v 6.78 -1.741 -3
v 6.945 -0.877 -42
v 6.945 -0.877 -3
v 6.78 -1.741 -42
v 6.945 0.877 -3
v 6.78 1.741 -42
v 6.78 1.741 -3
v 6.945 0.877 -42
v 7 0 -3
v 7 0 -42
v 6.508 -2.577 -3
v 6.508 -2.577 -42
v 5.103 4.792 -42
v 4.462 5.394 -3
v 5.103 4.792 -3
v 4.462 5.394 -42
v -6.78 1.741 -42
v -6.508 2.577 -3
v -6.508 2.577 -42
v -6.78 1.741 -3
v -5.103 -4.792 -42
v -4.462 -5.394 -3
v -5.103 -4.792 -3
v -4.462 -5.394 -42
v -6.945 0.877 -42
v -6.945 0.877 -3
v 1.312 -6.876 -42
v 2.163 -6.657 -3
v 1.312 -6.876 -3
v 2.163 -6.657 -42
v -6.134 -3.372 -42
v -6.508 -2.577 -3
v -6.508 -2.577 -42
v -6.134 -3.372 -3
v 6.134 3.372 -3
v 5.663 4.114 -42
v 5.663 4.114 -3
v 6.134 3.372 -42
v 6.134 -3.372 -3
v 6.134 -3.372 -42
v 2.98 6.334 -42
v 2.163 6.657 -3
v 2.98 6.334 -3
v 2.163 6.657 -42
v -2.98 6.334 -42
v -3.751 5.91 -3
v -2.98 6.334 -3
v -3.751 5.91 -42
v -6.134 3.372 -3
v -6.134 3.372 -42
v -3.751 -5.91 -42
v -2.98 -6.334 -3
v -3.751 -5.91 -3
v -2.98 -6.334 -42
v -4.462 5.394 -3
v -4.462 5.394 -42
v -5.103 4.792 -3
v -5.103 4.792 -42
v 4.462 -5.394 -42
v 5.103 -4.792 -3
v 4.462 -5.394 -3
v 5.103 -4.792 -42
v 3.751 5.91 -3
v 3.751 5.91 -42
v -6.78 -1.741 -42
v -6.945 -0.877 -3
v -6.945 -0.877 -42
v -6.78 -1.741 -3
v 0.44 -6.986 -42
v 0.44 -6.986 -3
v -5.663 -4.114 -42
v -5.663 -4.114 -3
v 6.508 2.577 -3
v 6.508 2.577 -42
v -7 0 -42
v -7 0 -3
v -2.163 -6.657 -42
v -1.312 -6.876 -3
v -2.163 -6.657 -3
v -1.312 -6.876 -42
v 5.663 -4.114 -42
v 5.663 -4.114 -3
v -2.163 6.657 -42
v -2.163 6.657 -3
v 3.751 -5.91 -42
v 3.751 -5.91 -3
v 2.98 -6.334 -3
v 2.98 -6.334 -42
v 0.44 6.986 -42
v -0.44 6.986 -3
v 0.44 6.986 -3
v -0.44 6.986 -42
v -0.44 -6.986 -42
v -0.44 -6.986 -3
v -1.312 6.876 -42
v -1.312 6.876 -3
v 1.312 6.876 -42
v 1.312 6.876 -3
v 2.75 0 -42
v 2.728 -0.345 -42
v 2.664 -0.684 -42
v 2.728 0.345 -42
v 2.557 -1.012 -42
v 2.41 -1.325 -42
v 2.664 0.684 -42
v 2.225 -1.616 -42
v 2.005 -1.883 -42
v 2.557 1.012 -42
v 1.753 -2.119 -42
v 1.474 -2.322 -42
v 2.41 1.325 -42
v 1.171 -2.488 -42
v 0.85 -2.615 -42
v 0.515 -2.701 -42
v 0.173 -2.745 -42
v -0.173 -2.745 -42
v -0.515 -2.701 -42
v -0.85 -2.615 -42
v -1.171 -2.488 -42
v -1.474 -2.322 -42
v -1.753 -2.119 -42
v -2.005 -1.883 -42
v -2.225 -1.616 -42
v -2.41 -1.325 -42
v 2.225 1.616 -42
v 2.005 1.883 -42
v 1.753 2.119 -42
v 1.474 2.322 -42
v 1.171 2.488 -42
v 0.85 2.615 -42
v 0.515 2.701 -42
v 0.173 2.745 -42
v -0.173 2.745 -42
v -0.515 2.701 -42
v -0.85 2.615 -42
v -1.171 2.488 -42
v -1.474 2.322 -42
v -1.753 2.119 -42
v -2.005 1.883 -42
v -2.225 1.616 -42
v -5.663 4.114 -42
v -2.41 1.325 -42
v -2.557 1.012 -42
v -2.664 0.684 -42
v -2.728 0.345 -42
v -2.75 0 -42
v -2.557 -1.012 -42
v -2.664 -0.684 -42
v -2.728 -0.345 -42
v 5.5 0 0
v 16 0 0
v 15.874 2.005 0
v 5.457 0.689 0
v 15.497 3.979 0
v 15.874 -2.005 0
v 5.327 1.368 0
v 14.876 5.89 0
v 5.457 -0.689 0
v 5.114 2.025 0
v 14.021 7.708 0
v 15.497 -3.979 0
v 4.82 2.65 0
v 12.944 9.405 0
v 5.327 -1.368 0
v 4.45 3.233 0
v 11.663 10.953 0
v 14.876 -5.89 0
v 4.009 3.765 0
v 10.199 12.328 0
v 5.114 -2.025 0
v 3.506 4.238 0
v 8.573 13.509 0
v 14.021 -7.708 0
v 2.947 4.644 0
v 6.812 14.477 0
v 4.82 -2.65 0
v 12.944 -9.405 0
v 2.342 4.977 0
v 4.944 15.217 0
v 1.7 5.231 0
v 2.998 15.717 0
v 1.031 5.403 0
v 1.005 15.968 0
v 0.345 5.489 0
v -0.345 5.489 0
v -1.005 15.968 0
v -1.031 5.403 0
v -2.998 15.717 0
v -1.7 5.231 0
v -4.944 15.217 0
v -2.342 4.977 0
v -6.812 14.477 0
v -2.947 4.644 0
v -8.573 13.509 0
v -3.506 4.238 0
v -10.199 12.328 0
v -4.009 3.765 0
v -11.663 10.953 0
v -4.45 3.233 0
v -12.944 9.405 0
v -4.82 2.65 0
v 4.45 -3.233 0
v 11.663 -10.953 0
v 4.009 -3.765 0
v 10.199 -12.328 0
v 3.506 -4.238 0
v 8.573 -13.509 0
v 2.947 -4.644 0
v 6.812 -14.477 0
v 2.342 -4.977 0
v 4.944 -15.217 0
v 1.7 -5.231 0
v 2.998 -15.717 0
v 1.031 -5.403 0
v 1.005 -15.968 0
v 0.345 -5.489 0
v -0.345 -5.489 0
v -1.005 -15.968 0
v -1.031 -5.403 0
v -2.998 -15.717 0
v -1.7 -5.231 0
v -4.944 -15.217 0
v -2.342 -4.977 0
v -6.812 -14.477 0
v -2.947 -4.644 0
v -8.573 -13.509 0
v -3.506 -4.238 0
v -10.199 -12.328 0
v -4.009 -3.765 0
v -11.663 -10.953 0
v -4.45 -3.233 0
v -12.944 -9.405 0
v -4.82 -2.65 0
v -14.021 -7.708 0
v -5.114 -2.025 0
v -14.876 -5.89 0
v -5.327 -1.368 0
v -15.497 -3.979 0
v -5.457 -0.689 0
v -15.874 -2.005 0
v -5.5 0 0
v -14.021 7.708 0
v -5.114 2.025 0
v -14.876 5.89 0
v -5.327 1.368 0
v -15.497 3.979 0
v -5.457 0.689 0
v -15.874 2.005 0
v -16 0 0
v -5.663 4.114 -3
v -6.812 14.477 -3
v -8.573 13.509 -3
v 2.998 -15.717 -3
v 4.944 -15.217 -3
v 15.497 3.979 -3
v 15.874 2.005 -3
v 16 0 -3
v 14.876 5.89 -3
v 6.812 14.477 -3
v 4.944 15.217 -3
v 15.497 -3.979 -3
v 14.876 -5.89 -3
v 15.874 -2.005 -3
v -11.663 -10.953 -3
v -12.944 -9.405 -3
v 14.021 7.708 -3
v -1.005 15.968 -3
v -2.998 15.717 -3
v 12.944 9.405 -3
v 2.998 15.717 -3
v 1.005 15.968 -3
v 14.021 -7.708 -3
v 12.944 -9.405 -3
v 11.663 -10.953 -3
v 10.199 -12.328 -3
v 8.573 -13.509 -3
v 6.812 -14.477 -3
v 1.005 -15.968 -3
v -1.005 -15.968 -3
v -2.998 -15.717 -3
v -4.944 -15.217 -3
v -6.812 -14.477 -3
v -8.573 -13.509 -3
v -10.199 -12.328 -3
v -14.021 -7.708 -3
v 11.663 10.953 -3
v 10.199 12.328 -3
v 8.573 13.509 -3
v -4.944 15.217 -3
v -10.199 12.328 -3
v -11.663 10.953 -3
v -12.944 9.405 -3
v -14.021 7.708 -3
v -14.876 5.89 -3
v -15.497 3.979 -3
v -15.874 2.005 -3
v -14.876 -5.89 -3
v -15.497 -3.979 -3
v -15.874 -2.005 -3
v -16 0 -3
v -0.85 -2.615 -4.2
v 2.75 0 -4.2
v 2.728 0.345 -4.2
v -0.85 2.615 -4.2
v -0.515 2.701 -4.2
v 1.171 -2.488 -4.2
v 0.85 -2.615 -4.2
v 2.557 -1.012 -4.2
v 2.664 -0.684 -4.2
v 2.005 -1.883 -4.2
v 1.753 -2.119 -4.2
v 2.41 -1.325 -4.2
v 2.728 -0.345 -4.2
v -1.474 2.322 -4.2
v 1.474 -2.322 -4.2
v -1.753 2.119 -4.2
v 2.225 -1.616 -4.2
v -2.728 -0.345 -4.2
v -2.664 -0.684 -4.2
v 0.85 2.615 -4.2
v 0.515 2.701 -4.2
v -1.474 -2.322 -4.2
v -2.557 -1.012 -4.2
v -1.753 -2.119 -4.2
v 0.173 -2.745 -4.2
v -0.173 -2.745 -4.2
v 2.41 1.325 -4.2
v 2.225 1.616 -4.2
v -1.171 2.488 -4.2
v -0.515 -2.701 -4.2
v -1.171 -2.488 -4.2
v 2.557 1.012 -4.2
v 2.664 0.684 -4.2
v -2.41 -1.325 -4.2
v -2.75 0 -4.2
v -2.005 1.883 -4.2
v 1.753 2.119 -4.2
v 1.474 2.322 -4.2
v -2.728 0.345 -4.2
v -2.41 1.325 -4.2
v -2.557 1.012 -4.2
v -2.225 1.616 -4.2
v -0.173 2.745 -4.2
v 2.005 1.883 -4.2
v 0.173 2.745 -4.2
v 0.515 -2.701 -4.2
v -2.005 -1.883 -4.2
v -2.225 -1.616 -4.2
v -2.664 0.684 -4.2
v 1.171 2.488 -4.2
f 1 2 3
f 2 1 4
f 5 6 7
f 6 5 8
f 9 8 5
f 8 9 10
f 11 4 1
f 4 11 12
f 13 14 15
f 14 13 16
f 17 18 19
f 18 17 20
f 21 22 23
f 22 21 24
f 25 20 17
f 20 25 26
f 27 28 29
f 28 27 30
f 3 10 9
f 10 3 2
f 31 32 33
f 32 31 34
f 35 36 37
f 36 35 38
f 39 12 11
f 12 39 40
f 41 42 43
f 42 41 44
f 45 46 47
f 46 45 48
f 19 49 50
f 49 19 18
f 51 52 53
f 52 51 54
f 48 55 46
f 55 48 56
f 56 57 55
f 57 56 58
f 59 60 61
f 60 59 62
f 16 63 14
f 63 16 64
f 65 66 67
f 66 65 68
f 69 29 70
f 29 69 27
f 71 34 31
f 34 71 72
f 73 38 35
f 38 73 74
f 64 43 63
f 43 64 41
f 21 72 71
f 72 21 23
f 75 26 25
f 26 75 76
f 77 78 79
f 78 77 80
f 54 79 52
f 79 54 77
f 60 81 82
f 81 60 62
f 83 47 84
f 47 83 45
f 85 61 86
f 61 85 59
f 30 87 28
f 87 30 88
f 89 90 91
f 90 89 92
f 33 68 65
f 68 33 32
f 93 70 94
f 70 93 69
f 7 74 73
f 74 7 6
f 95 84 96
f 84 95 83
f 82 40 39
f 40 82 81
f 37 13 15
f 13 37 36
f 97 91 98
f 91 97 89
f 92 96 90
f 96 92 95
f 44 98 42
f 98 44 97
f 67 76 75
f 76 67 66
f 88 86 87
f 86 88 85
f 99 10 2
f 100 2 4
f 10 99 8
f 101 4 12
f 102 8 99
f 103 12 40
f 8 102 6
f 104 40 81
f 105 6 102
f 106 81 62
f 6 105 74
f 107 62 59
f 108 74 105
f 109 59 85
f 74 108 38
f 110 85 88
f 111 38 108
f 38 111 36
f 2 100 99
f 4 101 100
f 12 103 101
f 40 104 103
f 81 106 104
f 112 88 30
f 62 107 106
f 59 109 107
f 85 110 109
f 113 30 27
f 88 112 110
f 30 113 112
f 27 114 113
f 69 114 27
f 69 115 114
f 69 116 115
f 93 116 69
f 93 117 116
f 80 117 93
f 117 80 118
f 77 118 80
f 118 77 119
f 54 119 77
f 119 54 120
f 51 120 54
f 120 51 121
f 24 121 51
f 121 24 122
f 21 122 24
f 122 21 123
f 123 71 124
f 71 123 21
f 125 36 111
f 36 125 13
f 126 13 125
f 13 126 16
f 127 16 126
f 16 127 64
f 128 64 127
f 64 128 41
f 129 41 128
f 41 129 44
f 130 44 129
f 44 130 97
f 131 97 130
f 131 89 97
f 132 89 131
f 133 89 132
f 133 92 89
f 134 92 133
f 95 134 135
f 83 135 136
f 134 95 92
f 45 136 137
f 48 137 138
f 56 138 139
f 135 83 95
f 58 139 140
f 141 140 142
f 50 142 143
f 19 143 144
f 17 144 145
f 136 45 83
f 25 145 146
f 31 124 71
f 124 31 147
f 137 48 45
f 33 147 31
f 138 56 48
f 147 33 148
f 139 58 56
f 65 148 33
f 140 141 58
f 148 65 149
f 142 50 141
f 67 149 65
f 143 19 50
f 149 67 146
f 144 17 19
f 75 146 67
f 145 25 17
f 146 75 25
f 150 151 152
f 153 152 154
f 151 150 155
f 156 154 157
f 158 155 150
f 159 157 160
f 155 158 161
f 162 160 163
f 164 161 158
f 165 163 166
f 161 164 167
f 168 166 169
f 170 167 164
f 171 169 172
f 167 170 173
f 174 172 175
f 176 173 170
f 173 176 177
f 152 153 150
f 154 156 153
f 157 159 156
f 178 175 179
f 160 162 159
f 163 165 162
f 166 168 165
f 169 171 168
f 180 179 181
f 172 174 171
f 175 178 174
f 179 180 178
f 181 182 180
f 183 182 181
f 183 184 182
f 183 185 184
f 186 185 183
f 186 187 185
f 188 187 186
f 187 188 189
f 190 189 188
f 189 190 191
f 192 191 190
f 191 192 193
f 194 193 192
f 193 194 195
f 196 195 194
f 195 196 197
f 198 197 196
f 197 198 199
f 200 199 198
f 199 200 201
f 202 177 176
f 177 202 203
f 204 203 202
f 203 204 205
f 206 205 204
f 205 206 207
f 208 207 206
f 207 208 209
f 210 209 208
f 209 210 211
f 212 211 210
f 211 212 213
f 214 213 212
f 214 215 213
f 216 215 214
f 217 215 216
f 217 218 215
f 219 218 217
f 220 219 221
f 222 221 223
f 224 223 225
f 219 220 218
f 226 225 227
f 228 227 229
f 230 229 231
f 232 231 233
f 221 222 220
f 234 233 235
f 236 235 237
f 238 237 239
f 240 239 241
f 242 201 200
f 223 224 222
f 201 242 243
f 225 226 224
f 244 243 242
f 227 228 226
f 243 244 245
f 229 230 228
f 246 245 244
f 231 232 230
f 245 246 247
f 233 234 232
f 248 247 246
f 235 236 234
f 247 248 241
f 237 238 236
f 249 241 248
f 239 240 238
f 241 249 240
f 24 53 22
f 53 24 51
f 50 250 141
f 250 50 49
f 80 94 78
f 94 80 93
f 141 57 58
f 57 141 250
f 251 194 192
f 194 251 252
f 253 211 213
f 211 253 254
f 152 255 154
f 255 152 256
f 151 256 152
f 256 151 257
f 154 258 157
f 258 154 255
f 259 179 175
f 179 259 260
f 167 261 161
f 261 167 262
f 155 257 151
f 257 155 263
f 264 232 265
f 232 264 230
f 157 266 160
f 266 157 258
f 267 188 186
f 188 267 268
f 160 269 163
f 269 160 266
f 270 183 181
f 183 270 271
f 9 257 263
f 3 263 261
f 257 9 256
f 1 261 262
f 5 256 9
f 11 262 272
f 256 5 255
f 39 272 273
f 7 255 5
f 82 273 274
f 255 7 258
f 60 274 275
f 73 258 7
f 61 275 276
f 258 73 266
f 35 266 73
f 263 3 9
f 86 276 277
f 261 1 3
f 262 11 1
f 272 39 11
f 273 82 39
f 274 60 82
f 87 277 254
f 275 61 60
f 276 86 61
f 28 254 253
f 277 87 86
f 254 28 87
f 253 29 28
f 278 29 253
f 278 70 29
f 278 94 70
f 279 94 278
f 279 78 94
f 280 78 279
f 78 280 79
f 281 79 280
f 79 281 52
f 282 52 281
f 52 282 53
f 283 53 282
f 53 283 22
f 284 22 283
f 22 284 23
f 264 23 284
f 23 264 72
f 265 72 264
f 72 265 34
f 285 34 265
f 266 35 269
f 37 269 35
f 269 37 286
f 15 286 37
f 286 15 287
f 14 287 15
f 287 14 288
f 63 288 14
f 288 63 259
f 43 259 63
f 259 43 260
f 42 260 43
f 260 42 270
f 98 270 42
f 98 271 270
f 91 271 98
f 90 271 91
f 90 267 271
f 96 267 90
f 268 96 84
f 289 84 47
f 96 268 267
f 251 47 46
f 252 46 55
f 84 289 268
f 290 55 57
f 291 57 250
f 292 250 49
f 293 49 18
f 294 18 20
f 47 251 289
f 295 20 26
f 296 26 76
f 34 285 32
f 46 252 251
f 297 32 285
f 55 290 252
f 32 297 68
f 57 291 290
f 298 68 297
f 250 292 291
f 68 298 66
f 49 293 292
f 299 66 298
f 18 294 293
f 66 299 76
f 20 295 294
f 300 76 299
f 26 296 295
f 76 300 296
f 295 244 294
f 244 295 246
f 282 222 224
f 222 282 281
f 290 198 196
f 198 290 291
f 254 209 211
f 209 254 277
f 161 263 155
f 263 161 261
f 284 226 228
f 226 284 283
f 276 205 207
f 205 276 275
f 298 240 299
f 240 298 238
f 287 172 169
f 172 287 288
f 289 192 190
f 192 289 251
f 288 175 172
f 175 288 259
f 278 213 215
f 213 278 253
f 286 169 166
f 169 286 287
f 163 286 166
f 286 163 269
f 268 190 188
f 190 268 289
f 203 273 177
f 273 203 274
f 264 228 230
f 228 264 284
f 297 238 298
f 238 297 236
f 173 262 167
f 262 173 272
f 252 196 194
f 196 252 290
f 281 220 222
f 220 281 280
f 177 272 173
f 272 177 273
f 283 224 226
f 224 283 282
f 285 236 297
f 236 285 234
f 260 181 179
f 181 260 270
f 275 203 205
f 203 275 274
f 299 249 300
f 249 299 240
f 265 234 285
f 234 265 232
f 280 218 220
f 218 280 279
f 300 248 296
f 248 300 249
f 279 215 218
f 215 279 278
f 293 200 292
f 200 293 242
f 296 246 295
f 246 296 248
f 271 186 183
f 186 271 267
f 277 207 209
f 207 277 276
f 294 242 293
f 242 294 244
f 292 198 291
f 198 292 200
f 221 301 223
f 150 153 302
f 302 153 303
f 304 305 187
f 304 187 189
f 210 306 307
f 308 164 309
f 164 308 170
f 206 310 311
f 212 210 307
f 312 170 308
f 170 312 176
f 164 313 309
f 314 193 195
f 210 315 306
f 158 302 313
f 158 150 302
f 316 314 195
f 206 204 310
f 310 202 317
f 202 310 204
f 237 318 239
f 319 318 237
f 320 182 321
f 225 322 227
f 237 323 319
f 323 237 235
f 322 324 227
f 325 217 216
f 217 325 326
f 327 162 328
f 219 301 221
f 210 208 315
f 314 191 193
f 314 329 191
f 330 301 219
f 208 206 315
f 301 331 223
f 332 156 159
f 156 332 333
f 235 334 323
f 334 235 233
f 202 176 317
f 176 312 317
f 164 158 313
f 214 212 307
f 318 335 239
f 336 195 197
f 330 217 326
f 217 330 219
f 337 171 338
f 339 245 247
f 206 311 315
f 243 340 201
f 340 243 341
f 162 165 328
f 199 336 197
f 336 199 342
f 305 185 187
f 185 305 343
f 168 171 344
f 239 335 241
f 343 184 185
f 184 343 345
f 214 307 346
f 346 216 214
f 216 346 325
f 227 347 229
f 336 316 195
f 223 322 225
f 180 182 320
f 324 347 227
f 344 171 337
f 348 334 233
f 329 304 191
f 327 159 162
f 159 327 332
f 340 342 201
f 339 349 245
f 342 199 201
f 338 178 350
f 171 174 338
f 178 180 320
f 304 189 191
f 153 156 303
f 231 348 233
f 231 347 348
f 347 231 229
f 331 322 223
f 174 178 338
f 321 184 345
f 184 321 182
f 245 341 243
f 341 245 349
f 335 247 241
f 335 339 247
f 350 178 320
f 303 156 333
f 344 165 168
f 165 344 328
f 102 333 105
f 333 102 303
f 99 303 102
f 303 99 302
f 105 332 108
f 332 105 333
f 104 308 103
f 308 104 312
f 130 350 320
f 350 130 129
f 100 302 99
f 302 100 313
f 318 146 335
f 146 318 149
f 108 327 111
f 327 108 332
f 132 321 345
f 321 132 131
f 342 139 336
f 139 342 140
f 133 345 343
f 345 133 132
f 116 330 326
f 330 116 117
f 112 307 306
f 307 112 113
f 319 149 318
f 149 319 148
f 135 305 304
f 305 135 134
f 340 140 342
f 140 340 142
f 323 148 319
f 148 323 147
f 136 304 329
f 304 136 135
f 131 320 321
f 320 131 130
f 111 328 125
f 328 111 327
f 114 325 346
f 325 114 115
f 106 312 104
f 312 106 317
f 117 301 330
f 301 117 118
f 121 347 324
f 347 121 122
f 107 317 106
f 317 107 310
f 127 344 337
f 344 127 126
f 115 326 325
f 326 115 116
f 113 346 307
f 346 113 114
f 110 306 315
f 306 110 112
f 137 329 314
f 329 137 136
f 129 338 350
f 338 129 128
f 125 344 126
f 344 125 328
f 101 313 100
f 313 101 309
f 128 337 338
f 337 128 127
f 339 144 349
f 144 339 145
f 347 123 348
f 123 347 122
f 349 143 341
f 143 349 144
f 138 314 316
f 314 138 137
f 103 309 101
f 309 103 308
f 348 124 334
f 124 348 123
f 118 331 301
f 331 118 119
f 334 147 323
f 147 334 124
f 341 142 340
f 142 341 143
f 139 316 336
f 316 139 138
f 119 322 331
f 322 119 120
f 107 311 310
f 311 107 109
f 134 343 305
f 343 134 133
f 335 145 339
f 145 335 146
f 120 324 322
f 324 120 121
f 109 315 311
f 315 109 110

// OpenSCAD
$fn = 50;


difference() {
	union() {
		translate(v = [0, 0, -42.0000000000]) {
			cylinder(h = 42, r = 7.0000000000);
		}
		translate(v = [0, 0, -3.0000000000]) {
			cylinder(h = 3, r = 16.0000000000);
		}
	}
	union() {
		translate(v = [0, 0, 0]) {
			rotate(a = [0, 0, 0]) {
				difference() {
					union() {
						#translate(v = [0, 0, -42.0000000000]) {
							cylinder(h = 42, r = 2.2500000000);
						}
						#translate(v = [0, 0, -4.2000000000]) {
							cylinder(h = 4.2000000000, r = 7.0000000000, r1 = 2.7500000000, r2 = 5.5000000000);
						}
						#translate(v = [0, 0, -42.0000000000]) {
							cylinder(h = 42, r = 2.7500000000);
						}
						#translate(v = [0, 0, -42.0000000000]) {
							cylinder(h = 42, r = 2.2500000000);
						}
					}
					union();
				}
			}
		}
	}
}
